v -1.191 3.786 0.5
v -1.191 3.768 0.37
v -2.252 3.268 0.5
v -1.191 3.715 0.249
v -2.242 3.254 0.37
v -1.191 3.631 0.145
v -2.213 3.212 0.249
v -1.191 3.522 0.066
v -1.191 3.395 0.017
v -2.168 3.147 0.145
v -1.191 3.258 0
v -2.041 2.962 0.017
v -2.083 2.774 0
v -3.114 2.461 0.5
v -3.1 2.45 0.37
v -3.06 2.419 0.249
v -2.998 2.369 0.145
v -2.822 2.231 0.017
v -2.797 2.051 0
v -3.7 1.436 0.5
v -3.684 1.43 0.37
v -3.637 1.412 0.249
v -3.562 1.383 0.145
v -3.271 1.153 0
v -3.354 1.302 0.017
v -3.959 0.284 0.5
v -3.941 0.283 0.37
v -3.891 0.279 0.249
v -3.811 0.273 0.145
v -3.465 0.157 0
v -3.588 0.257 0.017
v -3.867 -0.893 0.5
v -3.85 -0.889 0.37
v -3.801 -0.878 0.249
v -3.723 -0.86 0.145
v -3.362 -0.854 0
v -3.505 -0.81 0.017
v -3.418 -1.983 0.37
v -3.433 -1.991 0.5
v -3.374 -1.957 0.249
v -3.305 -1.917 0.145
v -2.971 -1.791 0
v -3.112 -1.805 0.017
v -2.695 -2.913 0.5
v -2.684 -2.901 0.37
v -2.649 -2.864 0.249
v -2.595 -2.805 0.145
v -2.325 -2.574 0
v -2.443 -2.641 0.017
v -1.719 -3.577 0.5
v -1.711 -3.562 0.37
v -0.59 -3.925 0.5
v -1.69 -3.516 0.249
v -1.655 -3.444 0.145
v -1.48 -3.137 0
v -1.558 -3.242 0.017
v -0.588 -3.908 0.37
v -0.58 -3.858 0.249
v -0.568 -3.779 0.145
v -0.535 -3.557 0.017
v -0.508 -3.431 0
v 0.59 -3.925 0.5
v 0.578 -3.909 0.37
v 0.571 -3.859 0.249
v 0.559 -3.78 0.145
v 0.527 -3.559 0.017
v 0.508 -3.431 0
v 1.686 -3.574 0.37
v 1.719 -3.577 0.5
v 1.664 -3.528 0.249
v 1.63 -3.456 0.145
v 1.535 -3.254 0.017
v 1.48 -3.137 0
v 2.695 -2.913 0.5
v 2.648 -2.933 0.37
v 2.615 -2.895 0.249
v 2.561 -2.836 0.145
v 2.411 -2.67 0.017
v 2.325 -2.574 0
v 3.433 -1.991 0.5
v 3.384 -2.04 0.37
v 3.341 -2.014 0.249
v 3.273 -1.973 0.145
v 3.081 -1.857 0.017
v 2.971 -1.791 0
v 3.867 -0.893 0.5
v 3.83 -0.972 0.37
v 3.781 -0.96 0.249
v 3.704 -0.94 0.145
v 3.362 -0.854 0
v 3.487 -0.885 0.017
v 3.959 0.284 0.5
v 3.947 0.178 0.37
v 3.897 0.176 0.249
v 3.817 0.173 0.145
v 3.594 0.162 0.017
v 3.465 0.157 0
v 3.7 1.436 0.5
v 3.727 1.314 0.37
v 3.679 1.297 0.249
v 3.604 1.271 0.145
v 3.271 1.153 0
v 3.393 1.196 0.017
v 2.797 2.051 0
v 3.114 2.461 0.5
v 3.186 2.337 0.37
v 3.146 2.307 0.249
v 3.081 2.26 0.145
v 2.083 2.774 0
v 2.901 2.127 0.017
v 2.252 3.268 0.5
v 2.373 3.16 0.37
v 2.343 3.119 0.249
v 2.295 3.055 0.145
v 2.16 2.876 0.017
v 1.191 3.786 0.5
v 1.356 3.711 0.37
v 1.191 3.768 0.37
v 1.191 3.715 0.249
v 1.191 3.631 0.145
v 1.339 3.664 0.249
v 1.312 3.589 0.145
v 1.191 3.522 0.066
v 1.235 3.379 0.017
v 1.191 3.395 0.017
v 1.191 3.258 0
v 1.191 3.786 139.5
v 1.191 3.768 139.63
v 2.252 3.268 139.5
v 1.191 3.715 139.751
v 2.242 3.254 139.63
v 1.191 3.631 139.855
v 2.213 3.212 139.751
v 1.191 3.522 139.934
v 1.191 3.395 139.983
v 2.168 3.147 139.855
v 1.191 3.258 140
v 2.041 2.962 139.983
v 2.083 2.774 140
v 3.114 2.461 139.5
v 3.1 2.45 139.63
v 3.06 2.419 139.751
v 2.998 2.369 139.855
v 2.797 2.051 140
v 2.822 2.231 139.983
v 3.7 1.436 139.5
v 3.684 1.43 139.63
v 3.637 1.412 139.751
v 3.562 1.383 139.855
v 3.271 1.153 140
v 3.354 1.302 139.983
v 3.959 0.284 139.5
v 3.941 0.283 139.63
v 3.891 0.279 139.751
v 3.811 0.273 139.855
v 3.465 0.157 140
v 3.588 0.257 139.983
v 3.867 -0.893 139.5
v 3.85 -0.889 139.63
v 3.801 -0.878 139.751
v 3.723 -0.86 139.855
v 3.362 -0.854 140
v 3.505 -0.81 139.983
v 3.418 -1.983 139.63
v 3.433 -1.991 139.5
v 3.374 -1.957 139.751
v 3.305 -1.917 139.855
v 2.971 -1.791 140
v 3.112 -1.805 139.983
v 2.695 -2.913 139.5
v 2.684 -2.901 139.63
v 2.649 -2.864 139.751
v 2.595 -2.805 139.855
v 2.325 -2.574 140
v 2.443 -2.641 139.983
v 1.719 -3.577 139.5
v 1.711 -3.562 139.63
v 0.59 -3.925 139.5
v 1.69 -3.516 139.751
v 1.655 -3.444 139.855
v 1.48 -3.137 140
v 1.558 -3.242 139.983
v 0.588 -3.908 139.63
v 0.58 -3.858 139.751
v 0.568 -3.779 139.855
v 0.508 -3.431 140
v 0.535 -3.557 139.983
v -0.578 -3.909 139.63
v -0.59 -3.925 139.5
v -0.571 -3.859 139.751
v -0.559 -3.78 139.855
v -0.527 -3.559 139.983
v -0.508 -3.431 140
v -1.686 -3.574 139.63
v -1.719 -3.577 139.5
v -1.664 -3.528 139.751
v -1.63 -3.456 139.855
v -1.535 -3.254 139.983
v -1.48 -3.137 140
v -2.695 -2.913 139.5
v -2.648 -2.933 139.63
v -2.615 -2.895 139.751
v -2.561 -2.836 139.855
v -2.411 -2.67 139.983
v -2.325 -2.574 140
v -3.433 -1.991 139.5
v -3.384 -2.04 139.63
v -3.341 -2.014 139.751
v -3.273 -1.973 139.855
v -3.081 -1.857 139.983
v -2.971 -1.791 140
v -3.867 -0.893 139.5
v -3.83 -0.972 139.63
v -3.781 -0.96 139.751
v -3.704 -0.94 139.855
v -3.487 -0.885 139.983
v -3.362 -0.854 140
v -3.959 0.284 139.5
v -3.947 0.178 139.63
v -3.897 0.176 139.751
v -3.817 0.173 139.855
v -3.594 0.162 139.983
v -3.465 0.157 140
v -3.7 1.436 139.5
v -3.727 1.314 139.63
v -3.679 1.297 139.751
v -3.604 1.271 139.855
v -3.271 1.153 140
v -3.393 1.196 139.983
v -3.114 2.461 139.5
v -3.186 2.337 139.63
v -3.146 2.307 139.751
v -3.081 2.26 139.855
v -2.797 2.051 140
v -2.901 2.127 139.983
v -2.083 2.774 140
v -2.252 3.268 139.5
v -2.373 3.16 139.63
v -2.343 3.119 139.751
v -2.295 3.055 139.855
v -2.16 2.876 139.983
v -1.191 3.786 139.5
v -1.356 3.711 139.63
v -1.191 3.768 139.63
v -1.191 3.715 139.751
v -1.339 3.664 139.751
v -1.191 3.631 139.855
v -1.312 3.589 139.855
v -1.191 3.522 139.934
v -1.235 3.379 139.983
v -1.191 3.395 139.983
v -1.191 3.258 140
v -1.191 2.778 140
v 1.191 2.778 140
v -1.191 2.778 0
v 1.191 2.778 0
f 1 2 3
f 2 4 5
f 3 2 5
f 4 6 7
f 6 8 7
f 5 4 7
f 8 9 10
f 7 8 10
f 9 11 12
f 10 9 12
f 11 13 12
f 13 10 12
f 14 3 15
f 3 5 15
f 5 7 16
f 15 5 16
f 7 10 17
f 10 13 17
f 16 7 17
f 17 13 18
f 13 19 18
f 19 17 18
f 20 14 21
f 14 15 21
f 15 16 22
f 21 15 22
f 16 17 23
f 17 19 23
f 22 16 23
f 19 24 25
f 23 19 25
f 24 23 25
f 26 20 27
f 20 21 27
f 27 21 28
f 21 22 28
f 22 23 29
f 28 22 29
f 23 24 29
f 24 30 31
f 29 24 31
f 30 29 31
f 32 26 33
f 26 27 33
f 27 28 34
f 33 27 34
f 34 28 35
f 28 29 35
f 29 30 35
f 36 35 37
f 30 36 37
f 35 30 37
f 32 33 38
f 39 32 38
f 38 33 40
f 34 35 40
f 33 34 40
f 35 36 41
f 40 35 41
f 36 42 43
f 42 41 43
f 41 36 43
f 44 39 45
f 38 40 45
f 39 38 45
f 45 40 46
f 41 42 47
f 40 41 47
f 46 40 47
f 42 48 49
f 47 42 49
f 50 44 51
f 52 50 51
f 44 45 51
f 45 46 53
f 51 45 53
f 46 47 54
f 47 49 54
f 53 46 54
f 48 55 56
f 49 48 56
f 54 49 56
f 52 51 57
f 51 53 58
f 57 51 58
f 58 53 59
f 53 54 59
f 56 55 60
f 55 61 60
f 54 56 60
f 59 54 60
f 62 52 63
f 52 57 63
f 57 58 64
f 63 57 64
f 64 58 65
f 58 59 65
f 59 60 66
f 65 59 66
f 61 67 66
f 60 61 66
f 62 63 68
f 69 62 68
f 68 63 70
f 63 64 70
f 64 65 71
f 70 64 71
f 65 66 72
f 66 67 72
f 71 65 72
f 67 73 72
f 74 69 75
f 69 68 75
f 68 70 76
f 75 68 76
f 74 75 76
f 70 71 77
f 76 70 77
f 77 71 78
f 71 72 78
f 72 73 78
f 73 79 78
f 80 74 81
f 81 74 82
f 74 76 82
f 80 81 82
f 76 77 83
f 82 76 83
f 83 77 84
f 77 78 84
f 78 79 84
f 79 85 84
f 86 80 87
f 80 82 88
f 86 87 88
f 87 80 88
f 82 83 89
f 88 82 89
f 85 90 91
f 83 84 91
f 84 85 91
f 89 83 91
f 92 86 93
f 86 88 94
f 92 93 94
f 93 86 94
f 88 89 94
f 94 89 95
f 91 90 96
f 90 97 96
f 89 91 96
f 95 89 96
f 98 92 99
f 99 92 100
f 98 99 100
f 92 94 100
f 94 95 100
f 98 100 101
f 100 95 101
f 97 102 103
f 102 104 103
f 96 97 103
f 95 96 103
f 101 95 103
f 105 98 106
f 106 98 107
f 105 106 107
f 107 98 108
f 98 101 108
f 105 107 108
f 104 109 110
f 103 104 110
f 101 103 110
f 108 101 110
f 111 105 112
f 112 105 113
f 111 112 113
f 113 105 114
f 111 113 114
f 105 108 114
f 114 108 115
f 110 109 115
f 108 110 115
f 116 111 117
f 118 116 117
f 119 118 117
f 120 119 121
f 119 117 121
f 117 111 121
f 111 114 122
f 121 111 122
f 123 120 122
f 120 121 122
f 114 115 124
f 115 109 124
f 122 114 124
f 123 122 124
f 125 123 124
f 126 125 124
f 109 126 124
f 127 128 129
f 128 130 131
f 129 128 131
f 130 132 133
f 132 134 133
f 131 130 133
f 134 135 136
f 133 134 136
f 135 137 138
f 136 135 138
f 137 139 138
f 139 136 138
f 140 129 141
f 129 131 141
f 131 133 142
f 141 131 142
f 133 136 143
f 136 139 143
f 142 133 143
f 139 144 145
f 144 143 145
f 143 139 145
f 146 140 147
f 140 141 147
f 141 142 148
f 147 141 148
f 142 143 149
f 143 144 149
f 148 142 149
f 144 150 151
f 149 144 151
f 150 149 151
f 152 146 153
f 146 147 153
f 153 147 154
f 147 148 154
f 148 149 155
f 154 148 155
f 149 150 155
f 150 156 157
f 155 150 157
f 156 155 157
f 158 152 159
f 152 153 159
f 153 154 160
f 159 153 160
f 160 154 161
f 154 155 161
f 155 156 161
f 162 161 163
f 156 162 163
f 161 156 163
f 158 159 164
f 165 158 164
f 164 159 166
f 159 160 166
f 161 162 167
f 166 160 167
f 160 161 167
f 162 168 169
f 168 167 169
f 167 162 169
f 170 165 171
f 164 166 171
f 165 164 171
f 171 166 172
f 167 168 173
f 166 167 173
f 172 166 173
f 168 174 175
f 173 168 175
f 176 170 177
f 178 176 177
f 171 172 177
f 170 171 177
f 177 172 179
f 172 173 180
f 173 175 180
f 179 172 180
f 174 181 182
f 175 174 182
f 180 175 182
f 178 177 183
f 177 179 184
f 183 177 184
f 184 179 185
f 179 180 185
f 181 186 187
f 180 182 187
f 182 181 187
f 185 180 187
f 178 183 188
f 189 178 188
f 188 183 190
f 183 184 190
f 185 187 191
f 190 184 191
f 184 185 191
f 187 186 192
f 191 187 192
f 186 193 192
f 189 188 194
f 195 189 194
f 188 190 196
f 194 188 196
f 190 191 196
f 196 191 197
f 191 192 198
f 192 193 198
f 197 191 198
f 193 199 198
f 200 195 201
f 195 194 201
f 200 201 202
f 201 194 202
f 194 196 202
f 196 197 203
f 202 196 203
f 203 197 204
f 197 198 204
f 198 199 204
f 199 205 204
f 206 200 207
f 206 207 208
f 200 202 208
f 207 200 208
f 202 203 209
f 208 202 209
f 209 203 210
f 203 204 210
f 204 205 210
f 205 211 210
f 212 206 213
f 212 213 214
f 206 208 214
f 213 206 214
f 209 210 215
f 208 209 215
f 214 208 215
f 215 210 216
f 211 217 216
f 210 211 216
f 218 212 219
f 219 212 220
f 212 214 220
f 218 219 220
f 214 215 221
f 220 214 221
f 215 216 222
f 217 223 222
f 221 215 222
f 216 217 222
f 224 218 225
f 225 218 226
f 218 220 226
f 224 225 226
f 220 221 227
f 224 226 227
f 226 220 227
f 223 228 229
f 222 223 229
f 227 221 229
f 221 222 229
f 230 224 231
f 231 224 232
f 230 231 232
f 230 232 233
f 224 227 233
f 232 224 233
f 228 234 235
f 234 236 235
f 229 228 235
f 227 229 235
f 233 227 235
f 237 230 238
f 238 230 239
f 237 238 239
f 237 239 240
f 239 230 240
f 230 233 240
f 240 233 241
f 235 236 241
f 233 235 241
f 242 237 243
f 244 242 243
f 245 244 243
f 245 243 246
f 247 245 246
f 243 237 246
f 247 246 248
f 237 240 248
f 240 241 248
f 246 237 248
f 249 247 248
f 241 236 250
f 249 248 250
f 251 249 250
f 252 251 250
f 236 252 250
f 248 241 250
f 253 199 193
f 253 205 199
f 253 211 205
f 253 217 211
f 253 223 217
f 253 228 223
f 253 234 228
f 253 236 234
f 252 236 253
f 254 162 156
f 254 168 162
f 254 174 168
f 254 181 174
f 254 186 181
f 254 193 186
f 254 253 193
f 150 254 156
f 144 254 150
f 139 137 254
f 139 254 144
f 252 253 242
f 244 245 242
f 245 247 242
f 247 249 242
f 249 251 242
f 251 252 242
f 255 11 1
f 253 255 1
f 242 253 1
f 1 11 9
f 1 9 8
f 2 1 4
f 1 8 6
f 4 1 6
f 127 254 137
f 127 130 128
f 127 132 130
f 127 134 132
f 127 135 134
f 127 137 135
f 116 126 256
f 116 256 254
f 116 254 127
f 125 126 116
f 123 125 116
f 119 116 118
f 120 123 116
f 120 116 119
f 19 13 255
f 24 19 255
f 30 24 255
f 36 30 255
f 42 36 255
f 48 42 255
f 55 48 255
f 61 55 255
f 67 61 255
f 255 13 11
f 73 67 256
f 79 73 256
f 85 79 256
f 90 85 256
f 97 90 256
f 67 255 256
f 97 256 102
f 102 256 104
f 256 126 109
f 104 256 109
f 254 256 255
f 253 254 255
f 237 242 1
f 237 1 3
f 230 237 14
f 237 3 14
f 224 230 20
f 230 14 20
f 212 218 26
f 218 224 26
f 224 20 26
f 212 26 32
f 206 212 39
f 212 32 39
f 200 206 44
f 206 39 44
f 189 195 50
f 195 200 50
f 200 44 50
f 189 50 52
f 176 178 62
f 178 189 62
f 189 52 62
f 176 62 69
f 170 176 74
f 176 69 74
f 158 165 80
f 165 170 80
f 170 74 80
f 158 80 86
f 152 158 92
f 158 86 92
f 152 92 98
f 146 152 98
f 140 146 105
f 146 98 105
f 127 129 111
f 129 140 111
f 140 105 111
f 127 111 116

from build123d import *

# Parameters (mm, degrees)
SKETCH1_R           = 3.96875
BOSS_EXTRUDE1_DEPTH = 140
SKETCH3_W           = 2.38125
SKETCH3_H           = 1.190625
CUT_EXTRUDE2_DEPTH  = 141.112461805
FILLET1_R           = 0.5


with BuildPart() as part:
    # Sketch1 → Boss-Extrude1 (new body)
    with BuildSketch(Plane.XY):
        Circle(SKETCH1_R)
    extrude(amount=BOSS_EXTRUDE1_DEPTH)

    # Sketch3 → Cut-Extrude2 (cut, through all)
    with BuildSketch(Plane(origin=(0, 0, 0), x_dir=(-1, 0, 0), z_dir=(0, 0, -1))):
        with Locations((0, 3.3734375)):
            Rectangle(SKETCH3_W, SKETCH3_H)
    extrude(amount=-CUT_EXTRUDE2_DEPTH, mode=Mode.SUBTRACT)

    # Fillet1
    fillet1_edges = [part.edges().sort_by_distance(p)[0] for p in [
        (0, -3.96875, 0),
        (0, -3.96875, 140),
    ]]
    fillet(fillet1_edges, radius=FILLET1_R)


solid = part.part
